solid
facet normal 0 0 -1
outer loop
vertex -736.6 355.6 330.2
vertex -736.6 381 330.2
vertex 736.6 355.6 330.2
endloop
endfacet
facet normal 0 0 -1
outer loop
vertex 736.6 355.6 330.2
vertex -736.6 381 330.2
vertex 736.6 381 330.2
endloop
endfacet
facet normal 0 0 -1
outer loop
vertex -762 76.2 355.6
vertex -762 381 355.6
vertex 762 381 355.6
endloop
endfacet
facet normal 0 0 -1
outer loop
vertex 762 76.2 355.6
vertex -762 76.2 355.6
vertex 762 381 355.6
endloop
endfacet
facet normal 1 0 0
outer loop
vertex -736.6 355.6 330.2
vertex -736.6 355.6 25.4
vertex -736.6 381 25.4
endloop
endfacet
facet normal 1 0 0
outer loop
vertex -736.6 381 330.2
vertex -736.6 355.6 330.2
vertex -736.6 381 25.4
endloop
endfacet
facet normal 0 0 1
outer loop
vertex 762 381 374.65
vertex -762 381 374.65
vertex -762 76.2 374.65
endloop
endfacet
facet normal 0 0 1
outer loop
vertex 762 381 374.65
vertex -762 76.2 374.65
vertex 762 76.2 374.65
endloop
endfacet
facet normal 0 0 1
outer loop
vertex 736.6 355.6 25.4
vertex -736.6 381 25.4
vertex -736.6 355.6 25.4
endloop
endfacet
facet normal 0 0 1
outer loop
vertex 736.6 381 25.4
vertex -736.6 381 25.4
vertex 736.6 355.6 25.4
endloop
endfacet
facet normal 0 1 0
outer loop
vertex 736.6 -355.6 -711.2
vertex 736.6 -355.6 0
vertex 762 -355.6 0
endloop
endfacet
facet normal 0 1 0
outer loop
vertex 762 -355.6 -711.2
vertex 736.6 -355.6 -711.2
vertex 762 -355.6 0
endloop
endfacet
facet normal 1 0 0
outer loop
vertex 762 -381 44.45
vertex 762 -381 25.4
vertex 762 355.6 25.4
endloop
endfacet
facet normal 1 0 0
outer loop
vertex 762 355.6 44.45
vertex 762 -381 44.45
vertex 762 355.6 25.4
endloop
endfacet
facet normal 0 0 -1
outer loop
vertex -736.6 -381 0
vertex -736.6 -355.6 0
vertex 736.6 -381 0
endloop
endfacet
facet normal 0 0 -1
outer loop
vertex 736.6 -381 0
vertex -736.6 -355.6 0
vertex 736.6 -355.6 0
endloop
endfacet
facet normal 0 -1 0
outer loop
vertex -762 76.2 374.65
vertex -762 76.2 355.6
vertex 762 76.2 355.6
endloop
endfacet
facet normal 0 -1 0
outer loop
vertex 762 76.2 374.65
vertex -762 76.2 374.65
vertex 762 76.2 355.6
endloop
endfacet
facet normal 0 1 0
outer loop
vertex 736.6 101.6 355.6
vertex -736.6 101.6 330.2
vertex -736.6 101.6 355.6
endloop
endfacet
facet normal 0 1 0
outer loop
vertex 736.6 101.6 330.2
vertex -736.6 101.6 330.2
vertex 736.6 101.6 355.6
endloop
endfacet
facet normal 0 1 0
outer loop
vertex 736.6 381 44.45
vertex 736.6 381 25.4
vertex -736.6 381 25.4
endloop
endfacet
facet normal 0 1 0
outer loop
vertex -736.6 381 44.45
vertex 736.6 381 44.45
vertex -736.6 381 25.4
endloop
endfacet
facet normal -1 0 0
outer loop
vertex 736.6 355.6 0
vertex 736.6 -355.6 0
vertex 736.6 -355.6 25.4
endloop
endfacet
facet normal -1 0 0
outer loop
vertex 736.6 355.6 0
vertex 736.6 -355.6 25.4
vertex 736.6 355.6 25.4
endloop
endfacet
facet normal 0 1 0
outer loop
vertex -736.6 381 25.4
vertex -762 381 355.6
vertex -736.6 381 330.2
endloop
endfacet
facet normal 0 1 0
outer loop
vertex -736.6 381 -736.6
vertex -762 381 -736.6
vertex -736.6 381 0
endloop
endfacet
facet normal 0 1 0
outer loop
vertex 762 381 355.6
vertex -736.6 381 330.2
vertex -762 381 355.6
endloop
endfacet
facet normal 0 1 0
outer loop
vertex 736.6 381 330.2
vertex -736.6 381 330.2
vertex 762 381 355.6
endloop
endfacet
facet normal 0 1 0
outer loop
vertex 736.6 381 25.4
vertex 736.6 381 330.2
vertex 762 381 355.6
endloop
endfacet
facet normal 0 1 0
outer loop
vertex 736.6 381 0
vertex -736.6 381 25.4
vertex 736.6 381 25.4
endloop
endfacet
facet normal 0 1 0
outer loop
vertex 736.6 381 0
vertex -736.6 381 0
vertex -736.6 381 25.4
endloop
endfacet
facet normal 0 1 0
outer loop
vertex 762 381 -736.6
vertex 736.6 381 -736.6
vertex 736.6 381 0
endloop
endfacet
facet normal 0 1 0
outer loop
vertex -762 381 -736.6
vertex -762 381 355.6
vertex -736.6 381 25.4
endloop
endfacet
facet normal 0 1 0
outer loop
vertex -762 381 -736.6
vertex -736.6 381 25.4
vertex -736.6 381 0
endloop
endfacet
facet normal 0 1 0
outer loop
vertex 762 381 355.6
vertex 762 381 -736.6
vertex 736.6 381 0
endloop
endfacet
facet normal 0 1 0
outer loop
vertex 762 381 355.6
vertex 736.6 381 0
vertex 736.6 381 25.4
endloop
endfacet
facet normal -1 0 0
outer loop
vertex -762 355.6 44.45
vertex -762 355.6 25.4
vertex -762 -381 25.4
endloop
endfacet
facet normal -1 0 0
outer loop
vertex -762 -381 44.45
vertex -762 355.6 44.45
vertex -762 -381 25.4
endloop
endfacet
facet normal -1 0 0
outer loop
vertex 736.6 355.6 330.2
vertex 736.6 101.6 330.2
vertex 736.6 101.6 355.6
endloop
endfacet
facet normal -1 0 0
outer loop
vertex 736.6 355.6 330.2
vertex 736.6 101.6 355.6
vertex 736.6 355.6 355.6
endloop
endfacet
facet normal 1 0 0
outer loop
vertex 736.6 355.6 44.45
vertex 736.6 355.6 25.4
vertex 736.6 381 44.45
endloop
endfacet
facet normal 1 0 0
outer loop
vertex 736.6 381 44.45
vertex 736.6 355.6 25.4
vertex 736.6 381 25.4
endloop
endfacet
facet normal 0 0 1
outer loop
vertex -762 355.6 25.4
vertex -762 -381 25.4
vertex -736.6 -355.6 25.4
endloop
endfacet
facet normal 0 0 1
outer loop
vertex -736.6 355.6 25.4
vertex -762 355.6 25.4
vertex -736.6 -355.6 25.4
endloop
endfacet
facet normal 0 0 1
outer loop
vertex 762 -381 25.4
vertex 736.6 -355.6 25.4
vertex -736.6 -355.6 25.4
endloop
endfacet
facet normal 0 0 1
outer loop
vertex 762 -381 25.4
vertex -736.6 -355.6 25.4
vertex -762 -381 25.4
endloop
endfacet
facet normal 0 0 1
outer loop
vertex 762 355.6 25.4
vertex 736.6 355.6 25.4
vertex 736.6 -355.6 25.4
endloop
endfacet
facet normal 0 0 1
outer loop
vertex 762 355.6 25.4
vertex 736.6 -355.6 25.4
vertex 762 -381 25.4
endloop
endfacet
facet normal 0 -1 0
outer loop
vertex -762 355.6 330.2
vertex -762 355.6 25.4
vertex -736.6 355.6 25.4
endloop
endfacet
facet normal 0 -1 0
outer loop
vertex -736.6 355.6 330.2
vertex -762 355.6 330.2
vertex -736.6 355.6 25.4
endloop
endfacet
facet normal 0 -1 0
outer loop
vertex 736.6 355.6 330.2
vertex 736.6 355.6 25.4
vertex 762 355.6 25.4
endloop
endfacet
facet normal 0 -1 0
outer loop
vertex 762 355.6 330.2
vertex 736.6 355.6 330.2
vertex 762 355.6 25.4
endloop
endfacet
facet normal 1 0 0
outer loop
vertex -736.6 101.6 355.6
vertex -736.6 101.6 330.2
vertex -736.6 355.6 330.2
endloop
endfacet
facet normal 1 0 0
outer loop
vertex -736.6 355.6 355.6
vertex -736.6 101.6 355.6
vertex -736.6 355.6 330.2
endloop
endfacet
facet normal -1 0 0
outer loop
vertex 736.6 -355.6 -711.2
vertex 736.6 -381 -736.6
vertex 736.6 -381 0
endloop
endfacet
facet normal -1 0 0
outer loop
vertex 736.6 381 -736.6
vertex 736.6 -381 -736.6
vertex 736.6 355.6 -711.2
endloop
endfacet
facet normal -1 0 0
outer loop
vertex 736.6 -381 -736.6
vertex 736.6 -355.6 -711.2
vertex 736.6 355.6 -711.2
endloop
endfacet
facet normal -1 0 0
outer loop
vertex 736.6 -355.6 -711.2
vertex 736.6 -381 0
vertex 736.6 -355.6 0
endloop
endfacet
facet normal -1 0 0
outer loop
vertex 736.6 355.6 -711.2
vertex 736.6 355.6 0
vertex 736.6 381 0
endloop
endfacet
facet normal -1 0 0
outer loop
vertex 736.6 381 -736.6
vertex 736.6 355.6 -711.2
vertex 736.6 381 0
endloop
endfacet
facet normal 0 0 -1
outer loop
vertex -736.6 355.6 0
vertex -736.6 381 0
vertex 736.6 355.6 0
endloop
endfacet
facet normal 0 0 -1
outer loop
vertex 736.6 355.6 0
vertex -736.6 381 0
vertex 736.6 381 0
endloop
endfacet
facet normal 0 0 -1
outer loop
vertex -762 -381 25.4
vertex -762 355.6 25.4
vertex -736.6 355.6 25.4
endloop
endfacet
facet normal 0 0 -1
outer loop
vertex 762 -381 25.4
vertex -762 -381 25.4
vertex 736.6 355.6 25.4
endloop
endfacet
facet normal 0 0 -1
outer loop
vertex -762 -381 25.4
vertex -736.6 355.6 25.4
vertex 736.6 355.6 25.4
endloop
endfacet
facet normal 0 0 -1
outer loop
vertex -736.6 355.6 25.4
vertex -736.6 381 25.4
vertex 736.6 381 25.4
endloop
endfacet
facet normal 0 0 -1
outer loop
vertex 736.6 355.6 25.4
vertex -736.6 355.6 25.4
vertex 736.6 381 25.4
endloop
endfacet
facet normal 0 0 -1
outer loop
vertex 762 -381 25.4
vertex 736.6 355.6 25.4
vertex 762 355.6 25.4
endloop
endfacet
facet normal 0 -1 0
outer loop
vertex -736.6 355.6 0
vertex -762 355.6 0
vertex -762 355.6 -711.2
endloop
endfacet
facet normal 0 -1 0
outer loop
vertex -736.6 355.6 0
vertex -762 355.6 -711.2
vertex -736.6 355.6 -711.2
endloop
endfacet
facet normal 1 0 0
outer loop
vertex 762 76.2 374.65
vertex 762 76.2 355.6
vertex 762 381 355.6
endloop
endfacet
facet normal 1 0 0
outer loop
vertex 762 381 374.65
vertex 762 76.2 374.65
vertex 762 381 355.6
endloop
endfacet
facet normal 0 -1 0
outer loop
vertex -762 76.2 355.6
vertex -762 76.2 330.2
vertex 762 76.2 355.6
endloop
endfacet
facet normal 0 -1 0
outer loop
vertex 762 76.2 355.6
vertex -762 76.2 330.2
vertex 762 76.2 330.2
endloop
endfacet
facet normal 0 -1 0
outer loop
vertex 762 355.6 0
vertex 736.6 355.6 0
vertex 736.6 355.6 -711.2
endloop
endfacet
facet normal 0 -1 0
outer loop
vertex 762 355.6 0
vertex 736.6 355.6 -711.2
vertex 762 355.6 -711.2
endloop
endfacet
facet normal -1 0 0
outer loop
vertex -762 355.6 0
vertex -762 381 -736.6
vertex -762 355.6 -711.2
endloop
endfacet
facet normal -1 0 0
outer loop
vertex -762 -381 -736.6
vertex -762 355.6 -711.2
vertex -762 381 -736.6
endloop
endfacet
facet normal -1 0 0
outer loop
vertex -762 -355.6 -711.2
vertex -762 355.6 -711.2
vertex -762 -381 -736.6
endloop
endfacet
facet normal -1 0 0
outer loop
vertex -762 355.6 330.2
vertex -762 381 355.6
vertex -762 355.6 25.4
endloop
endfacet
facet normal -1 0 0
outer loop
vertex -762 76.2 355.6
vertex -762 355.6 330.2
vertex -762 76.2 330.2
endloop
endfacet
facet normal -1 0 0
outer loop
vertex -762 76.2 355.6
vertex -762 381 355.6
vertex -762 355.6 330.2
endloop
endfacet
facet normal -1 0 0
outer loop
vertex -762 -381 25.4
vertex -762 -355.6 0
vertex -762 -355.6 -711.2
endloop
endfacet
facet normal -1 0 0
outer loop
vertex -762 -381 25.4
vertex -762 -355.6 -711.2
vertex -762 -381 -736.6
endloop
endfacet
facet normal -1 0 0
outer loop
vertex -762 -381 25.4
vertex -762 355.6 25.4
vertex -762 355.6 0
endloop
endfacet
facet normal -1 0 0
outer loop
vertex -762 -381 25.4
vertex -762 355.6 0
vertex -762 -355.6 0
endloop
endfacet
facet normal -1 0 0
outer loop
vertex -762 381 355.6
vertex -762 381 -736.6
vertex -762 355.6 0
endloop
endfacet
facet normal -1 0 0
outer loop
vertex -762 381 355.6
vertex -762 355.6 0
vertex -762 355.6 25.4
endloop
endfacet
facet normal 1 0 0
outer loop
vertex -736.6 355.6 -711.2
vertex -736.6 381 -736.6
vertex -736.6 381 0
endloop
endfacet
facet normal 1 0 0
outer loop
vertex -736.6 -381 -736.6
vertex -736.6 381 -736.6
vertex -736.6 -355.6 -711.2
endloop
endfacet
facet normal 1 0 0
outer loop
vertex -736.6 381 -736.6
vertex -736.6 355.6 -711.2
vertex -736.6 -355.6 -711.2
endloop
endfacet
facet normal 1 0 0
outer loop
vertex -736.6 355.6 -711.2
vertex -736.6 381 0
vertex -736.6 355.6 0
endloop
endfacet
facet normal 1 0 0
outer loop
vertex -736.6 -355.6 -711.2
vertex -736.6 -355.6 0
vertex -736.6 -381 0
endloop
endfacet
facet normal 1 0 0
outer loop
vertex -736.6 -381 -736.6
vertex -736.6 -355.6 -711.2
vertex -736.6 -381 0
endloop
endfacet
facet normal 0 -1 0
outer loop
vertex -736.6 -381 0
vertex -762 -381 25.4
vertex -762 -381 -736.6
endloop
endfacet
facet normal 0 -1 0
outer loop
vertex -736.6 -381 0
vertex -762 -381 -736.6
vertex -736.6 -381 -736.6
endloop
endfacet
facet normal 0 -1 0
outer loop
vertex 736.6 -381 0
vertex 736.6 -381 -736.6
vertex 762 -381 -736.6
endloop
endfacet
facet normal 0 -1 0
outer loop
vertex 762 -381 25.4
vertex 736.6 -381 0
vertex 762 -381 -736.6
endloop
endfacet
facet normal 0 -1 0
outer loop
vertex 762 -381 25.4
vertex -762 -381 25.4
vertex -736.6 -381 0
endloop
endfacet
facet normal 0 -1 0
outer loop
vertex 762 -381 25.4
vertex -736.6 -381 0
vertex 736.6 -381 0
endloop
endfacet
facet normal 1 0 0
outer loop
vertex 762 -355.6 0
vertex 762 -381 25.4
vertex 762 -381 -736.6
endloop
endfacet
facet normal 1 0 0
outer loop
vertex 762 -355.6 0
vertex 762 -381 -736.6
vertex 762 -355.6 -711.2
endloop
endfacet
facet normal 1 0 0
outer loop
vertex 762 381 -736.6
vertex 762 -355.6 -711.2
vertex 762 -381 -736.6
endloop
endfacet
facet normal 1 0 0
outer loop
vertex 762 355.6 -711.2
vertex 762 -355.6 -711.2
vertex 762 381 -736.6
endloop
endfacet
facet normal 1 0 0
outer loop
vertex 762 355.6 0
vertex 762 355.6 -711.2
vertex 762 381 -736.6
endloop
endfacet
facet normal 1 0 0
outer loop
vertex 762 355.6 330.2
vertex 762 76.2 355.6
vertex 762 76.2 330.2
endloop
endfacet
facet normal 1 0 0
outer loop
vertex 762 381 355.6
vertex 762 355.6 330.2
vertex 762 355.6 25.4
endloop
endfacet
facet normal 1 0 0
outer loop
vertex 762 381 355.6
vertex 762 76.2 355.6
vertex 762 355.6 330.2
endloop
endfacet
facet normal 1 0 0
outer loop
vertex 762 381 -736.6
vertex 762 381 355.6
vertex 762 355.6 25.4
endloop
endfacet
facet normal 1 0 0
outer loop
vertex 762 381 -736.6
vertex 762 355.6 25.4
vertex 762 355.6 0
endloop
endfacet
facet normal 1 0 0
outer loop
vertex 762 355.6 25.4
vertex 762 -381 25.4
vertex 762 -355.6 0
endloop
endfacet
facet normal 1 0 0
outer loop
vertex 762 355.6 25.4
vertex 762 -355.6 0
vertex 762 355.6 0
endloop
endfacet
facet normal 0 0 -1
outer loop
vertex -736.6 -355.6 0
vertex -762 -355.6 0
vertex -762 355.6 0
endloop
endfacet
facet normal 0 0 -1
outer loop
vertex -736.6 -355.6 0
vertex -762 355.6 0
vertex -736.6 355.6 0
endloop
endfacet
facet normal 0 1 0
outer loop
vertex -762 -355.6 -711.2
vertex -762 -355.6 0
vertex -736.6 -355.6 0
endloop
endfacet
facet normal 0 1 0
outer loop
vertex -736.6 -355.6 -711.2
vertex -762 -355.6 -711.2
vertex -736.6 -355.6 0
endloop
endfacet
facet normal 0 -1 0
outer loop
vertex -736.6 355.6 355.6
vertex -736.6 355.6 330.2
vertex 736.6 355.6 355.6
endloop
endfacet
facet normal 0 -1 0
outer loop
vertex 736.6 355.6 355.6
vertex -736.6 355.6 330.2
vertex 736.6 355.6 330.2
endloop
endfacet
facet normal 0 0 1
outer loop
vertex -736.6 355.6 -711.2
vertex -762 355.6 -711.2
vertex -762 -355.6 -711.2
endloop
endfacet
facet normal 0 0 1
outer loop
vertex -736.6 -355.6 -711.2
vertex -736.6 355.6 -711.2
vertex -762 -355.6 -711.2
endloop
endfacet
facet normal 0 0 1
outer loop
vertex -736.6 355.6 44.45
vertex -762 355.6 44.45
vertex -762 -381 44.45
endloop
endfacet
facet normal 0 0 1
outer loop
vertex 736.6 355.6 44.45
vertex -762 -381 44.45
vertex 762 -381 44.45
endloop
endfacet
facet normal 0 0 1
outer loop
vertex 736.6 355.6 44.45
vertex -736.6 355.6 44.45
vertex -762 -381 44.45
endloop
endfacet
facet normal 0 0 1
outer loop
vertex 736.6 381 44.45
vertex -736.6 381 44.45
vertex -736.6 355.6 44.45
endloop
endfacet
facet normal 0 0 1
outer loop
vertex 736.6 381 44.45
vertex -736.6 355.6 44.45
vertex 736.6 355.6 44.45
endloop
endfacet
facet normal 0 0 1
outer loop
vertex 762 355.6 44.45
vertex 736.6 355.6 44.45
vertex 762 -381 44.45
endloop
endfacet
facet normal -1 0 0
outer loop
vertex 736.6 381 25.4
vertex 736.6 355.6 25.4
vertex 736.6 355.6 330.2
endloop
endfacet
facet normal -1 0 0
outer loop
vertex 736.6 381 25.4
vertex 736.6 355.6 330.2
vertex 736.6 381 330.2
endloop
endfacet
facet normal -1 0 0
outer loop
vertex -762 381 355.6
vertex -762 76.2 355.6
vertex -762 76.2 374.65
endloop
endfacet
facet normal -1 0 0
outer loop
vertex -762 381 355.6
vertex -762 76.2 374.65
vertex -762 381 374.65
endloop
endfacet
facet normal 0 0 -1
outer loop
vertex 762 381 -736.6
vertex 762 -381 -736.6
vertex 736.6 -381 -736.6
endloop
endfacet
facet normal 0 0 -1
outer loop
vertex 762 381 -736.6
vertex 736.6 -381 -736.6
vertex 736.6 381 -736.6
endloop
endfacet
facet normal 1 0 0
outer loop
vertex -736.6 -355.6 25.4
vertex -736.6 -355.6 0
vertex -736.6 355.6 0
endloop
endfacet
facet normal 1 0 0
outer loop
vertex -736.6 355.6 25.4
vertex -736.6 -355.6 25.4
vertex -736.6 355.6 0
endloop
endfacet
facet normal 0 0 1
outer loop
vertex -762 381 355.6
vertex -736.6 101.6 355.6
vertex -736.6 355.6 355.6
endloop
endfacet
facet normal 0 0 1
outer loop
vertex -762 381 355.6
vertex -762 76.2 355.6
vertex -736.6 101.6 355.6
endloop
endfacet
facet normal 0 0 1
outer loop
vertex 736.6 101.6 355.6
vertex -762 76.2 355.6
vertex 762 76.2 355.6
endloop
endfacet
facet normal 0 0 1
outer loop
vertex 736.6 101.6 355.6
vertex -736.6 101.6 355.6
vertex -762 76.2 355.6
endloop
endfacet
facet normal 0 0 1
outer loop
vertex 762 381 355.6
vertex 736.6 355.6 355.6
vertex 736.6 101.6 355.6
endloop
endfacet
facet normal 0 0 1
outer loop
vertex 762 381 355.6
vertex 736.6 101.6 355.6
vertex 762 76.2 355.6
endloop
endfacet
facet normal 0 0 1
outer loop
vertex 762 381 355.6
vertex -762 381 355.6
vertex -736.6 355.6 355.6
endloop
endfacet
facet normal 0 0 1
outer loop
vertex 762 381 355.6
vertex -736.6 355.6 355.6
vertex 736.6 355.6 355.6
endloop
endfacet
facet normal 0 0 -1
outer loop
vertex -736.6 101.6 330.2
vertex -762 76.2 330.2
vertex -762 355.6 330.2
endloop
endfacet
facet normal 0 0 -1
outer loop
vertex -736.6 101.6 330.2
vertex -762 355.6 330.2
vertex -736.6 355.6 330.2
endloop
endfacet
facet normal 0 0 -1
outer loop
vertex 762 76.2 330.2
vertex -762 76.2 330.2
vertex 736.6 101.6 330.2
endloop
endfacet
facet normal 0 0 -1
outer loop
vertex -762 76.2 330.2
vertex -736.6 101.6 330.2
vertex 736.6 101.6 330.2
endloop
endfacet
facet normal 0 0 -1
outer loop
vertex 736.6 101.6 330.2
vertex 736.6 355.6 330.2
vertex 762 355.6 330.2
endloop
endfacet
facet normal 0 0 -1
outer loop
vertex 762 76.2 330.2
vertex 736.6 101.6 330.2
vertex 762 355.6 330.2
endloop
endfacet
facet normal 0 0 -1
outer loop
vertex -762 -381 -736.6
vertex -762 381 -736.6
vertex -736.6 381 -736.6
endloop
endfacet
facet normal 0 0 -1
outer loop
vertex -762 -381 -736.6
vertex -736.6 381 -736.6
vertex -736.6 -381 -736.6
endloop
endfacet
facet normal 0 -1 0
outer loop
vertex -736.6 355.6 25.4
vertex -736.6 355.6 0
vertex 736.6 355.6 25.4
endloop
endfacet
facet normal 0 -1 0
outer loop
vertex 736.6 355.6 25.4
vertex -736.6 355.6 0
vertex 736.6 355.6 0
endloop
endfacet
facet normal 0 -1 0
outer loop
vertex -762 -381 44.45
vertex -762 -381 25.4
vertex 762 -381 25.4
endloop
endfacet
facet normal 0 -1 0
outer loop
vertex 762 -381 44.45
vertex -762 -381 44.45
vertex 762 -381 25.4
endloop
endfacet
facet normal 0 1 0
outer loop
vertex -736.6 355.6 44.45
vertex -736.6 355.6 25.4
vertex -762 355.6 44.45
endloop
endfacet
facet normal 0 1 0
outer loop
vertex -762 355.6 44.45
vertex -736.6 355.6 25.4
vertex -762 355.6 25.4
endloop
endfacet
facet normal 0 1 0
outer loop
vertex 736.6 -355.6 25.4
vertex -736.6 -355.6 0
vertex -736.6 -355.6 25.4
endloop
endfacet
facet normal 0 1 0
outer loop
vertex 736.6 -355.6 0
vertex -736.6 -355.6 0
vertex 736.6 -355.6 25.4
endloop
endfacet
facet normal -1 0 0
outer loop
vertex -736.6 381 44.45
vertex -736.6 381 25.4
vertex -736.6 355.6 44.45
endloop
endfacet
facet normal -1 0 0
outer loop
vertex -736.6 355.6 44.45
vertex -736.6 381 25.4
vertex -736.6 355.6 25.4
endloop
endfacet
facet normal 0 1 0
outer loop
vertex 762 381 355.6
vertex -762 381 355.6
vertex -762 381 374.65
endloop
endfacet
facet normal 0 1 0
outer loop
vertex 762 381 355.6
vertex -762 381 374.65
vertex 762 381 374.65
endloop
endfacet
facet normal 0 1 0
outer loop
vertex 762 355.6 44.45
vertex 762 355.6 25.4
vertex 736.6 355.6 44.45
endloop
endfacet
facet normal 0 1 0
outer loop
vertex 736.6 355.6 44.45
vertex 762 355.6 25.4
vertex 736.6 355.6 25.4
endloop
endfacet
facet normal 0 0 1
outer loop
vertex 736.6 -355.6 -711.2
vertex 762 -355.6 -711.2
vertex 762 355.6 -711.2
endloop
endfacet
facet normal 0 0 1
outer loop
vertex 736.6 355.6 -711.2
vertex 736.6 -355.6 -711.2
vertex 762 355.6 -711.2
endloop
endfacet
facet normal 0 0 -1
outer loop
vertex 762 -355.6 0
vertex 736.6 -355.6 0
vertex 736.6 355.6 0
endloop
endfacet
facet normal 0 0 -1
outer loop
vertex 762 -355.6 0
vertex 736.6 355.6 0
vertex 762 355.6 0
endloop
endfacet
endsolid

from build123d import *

# Parameters (mm, degrees)
F0_W      = 1524
F0_H      = 762
F0_W_2    = 1473.2
F0_H_2    = 711.2
F1_DEPTH  = 25.4
F2_W      = 25.4
F2_H      = 25.4
F3_DEPTH  = 736.6
F4_W      = 25.4
F4_H      = 25.4
F5_DEPTH  = 304.8
F6_W      = 1524
F6_H      = 304.8
F6_W_2    = 1473.2
F6_H_2    = 254
F7_DEPTH  = 25.4
F8_W      = 711.2
F8_H      = 25.4
F9_DEPTH  = 25.4
F10_W     = 711.2
F10_H     = 25.4
F11_DEPTH = 25.4
F13_DEPTH = 19.05
F14_W     = 1524
F14_H     = 304.8
F14_W_2   = 1473.2
F14_H_2   = 254
F15_DEPTH = 19.05


# Not quite as in the source:
# - a length typed as a fraction of an inch, garbled in the dataset ("3 / 203.2 mm" for 3/8 in), is restored
# - a feature names something its author has since deleted; it is built from what else it names


with BuildPart() as f1:
    # F0 (on Top) → F1 (new body)
    with BuildSketch(Plane.XY):
        Rectangle(F0_W, F0_H)
        Rectangle(F0_W_2, F0_H_2, mode=Mode.SUBTRACT)
    extrude(amount=F1_DEPTH)

    # F2 (on face) → F3 (join)
    with BuildSketch(Plane(origin=(0, 0, 0), x_dir=(1, 0, 0), z_dir=(0, 0, -1))):
        with Locations((-749.3, 368.3)):
            Rectangle(F2_W, F2_H)
        with Locations((-749.3, -368.3)):
            Rectangle(F2_W, F2_H)
        with Locations((749.3, -368.3)):
            Rectangle(F2_W, F2_H)
        with Locations((749.3, 368.3)):
            Rectangle(F2_W, F2_H)
    extrude(amount=F3_DEPTH)

    # F4 (on face) → F5 (join)
    with BuildSketch(Plane.XY.offset(25.4)):
        with Locations((749.3, 368.3)):
            Rectangle(F4_W, F4_H)
        with Locations((-749.3, 368.3)):
            Rectangle(F4_W, F4_H)
    extrude(amount=F5_DEPTH)

    # F6 (on face) → F7 (join)
    with BuildSketch(Plane.XY.offset(330.2)):
        with Locations((0, 228.6)):
            Rectangle(F6_W, F6_H)
        with Locations((0, 228.6)):
            Rectangle(F6_W_2, F6_H_2, mode=Mode.SUBTRACT)
    extrude(amount=F7_DEPTH)

    # F8 (on face) → F9 (join)
    with BuildSketch(Plane.YZ.offset(762)):
        with Locations((0, -723.9)):
            Rectangle(F8_W, F8_H)
    extrude(amount=-F9_DEPTH)

    # F10 (on face) → F11 (join)
    with BuildSketch(Plane(origin=(-762, 0, 0), x_dir=(0, -1, 0), z_dir=(-1, 0, 0))):
        with Locations((0, -723.9)):
            Rectangle(F10_W, F10_H)
    extrude(amount=-F11_DEPTH)


with BuildPart() as f13:
    # F12 (on face) → F13 (new body)
    with BuildSketch(Plane.XY.offset(25.4)):
        Polygon((-736.6, 381), (-736.6, 355.6), (-736.6, -355.6), (736.6, -355.6), (736.6, 355.6), (736.6, 381), align=None)
        Polygon((-762, 355.6), (-762, -381), (762, -381), (762, 355.6), (736.6, 355.6), (736.6, -355.6), (-736.6, -355.6), (-736.6, 355.6), align=None)
    extrude(amount=F13_DEPTH)


with BuildPart() as f15:
    # F14 (on face) → F15 (new body)
    with BuildSketch(Plane.XY.offset(355.6)):
        with Locations((0, 228.6)):
            Rectangle(F14_W, F14_H)
        with Locations((0, 228.6)):
            Rectangle(F14_W_2, F14_H_2, mode=Mode.SUBTRACT)
        with Locations((0, 228.6)):
            Rectangle(F14_W_2, F14_H_2)
    extrude(amount=F15_DEPTH)


solid = Compound([f1.part, f13.part, f15.part])
